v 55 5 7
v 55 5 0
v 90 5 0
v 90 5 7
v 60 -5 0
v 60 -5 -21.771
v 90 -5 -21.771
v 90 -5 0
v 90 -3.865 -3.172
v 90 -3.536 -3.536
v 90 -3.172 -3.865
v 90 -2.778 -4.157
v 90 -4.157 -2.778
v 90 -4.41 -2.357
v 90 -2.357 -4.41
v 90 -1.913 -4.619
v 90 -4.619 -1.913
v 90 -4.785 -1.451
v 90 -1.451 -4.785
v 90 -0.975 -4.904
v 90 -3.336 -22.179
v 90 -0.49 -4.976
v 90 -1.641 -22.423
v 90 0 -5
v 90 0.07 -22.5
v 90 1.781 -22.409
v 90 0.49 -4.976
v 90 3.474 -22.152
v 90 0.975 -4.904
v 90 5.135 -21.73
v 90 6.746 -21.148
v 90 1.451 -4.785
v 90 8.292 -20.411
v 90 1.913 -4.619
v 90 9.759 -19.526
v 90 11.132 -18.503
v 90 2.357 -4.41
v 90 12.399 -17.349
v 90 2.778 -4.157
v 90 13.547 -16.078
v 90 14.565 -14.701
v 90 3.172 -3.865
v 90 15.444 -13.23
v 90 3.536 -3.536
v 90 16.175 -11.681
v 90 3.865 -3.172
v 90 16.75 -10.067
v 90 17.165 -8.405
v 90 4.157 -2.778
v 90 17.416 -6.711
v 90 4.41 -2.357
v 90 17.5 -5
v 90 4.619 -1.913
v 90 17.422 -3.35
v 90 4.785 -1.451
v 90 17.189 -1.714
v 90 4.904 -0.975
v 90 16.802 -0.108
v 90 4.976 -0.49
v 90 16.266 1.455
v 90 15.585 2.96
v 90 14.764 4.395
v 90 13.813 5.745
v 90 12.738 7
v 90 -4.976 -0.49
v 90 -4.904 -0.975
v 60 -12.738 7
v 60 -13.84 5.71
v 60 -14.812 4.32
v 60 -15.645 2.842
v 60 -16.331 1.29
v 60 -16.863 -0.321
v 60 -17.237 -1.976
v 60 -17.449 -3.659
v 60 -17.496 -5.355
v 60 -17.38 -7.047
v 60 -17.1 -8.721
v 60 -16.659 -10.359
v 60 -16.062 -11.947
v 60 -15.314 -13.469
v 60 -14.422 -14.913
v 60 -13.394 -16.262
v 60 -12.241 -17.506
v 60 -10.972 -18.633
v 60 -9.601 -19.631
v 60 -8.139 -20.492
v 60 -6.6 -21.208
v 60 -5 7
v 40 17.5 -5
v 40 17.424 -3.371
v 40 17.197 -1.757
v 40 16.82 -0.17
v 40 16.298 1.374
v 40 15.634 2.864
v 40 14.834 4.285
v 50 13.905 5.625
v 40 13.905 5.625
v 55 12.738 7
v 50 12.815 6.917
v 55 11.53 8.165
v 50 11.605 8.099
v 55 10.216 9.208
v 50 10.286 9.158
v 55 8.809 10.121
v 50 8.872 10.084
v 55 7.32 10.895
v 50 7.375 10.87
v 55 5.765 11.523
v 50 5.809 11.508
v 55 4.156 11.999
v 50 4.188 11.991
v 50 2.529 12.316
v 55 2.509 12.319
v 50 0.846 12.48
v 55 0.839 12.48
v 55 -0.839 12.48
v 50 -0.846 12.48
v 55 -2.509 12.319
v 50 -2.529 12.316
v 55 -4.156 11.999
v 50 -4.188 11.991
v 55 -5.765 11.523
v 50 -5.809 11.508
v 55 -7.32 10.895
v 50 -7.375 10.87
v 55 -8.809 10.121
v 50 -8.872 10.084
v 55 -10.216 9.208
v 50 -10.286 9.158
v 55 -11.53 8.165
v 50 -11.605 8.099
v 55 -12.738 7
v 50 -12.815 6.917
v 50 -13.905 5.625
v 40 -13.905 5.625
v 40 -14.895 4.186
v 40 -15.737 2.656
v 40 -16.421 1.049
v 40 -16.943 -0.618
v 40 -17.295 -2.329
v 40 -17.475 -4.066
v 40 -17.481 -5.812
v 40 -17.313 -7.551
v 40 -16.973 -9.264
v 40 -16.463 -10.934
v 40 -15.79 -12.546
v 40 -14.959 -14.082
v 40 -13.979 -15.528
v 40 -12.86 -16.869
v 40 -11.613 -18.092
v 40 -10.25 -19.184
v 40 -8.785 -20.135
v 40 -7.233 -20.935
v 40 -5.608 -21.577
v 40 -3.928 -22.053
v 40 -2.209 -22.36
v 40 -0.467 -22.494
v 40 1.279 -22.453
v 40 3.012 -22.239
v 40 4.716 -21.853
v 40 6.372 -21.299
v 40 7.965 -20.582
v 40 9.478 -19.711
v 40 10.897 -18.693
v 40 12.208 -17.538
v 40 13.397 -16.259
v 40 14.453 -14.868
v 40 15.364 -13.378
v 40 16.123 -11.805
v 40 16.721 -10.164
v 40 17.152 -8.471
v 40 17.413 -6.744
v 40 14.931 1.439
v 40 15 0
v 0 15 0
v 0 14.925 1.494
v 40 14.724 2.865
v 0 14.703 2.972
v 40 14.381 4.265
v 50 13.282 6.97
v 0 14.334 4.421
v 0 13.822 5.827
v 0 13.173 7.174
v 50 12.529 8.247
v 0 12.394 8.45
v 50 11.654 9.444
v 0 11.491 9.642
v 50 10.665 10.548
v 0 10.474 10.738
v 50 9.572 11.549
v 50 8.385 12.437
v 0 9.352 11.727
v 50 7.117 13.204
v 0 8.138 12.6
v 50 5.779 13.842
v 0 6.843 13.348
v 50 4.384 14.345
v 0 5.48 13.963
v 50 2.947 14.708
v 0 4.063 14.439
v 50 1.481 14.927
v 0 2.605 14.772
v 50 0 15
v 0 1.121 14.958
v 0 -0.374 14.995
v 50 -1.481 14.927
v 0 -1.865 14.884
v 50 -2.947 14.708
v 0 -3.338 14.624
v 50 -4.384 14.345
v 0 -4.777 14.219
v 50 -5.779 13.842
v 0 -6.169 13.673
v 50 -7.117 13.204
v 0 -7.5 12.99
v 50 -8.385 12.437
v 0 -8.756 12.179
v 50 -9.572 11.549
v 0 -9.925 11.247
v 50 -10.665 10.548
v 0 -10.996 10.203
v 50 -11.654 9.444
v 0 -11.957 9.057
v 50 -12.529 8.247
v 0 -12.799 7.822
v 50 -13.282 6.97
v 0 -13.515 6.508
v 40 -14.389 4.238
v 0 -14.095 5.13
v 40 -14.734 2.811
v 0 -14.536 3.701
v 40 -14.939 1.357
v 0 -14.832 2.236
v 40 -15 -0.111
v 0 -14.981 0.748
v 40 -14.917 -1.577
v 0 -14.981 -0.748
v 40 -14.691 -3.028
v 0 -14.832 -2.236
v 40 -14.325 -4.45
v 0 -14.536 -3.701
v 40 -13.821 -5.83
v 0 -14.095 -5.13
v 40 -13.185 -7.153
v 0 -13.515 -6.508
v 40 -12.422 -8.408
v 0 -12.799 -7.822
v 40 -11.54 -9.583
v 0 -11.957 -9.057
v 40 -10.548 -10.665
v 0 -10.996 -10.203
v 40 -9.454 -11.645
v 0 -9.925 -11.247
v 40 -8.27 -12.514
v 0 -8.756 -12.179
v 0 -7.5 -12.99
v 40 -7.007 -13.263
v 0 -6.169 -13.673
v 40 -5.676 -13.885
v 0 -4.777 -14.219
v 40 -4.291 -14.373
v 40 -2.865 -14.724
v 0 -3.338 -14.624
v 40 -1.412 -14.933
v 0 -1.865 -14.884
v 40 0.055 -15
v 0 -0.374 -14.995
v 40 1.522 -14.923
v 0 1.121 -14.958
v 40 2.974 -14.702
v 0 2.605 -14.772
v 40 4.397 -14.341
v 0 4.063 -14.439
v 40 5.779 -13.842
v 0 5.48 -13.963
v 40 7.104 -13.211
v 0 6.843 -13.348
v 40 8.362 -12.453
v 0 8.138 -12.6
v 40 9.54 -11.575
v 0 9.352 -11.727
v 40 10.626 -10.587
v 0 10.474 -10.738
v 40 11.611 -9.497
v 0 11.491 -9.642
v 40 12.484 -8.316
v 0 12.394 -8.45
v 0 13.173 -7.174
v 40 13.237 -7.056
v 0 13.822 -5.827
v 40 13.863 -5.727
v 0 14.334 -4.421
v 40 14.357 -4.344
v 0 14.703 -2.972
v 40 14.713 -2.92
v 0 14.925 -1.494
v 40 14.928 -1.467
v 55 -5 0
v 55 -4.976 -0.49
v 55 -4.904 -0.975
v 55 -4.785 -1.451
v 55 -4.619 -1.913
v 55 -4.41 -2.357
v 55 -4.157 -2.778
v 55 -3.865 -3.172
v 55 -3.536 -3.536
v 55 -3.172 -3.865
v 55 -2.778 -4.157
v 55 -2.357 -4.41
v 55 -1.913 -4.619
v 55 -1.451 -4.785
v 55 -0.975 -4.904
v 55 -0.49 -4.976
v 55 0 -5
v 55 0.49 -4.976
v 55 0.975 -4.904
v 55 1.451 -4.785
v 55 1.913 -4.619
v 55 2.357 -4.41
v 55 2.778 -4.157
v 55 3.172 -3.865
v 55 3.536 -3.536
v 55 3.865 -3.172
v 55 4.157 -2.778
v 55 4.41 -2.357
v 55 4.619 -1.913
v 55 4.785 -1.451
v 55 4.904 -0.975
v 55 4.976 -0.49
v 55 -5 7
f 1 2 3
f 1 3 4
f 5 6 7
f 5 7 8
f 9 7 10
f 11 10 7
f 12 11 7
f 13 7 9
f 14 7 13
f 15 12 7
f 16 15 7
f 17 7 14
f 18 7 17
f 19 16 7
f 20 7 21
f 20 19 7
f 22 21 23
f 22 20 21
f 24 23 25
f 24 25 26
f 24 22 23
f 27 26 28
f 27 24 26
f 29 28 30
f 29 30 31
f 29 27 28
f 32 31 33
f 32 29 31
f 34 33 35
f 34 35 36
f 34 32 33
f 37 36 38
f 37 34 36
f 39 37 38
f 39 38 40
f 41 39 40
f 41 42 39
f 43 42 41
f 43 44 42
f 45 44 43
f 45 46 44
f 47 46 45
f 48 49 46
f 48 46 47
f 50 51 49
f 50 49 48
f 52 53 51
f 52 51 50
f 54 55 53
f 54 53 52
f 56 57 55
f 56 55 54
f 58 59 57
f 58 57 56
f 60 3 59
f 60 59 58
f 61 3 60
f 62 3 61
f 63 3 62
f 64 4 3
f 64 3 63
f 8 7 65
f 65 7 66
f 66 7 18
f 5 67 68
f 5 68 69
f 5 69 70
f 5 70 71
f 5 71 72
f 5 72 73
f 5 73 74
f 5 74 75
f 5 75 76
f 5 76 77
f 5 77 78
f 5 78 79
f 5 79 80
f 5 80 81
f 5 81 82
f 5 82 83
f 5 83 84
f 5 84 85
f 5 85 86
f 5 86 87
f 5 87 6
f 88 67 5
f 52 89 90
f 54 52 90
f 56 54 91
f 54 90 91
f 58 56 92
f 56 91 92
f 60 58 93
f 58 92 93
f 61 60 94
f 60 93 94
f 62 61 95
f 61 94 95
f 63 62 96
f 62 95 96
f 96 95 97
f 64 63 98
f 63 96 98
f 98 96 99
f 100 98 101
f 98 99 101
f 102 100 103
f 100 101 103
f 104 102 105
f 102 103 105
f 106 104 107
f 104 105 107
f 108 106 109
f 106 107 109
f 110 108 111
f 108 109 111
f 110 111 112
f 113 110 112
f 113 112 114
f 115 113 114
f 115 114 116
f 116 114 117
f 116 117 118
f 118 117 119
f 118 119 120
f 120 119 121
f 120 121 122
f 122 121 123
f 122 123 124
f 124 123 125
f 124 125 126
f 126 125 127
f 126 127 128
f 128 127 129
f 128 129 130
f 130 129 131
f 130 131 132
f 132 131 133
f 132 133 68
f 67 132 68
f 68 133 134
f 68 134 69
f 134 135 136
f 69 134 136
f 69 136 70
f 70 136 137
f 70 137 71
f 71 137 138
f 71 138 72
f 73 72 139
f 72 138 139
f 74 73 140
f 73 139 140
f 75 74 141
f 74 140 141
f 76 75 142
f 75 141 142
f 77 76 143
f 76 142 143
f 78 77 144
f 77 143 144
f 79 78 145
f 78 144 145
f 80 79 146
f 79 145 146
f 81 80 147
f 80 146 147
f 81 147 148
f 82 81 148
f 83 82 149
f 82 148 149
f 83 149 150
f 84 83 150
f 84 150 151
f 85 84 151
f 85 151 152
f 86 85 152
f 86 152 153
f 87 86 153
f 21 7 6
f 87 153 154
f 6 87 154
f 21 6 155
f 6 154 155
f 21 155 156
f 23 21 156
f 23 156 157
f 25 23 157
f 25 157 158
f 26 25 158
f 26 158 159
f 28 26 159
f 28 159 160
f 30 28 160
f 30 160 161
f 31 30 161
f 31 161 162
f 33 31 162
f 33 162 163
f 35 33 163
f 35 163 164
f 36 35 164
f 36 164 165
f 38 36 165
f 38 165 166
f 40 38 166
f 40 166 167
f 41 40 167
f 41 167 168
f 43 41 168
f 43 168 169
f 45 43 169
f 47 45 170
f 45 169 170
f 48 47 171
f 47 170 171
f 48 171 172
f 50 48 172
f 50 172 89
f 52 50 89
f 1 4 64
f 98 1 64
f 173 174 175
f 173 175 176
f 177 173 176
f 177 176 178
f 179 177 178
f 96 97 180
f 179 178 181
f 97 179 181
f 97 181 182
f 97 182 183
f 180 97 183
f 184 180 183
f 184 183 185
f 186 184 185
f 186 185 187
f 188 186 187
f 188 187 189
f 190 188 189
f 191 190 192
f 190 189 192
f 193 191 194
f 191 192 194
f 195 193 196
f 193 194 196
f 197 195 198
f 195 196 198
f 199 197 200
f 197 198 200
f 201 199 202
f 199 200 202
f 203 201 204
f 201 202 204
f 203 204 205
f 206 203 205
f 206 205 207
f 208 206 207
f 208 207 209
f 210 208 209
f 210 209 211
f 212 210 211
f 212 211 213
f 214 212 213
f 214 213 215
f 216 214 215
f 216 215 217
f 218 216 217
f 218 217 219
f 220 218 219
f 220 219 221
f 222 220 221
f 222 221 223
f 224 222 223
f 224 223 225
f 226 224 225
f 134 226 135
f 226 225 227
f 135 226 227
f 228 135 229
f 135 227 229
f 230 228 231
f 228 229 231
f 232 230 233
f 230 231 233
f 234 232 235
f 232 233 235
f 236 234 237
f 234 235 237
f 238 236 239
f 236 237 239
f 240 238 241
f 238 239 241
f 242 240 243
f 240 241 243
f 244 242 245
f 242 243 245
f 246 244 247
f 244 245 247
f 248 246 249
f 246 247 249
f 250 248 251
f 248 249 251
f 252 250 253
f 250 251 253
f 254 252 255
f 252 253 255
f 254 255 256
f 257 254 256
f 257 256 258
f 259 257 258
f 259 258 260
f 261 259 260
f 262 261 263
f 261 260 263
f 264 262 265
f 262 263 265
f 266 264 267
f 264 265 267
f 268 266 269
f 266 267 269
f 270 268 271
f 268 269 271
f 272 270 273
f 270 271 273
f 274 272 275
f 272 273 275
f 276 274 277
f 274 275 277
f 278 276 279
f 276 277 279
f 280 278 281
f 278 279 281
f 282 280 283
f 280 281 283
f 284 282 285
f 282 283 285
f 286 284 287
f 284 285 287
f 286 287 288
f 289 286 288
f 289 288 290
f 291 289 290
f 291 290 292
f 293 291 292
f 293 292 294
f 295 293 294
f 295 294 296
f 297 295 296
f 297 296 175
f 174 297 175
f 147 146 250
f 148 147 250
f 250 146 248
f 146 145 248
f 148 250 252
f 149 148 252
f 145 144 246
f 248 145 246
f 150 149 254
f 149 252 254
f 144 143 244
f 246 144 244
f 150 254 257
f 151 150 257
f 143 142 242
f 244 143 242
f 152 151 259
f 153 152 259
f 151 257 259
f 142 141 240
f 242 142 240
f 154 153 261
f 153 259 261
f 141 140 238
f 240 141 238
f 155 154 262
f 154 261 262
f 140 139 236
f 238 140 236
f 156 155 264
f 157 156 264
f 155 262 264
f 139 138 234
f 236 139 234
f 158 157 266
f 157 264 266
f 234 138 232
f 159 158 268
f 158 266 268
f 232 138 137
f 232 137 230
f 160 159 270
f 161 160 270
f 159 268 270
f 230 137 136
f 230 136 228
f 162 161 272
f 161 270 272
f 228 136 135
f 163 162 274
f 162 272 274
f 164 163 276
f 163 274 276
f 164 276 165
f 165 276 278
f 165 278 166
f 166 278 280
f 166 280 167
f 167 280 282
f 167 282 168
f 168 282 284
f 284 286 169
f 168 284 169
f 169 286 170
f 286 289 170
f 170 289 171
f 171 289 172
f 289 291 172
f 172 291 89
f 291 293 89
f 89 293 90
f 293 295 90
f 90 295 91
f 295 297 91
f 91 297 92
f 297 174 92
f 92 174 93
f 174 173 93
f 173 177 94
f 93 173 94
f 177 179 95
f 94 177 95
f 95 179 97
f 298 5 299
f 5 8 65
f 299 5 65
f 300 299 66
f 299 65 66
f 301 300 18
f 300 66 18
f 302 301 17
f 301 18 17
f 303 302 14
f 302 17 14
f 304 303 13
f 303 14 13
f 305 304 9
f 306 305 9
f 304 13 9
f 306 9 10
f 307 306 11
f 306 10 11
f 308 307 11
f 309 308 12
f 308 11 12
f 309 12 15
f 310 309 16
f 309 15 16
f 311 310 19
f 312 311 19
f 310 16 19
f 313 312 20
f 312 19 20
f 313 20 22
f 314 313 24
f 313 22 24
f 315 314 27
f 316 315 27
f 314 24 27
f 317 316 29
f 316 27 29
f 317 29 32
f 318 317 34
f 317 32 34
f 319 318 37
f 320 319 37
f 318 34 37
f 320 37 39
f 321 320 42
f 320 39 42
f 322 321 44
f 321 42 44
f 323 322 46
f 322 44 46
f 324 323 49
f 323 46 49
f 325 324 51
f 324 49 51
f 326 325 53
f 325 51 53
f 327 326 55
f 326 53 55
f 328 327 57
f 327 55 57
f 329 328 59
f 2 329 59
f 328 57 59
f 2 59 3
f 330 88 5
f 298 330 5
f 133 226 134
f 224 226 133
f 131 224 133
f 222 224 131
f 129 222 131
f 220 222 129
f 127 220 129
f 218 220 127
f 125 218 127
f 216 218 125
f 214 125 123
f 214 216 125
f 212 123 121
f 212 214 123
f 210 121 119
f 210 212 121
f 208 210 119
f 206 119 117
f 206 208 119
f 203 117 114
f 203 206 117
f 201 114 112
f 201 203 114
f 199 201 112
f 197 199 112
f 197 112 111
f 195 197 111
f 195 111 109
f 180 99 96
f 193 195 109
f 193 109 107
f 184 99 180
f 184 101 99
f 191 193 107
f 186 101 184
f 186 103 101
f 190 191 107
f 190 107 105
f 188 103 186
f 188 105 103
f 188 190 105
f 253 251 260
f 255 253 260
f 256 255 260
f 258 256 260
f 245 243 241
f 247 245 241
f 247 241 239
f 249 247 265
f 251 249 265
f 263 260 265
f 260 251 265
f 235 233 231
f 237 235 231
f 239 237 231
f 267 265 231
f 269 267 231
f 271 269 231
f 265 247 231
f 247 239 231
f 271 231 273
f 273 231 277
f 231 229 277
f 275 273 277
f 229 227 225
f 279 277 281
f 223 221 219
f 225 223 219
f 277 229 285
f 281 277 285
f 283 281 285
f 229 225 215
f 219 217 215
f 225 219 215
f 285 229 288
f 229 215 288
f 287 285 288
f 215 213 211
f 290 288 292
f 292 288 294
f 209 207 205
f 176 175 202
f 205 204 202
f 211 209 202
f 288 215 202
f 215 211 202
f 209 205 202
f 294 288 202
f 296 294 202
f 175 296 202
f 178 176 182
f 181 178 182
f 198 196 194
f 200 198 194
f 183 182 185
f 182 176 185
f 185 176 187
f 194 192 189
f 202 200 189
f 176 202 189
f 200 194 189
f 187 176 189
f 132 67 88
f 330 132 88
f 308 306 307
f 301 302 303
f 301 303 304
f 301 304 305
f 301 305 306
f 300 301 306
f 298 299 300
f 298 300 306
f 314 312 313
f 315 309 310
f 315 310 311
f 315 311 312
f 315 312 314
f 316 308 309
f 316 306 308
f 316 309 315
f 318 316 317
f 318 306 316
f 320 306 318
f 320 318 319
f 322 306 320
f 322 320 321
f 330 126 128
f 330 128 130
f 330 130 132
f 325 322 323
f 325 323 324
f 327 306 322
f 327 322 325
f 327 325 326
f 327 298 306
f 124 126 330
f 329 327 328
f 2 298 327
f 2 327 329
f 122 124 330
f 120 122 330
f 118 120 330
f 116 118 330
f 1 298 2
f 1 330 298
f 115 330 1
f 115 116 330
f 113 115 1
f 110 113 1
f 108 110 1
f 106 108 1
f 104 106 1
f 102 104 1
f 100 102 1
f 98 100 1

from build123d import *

# Parameters (mm, degrees)
F0_R     = 15
F1_DEPTH = 50
F3_DEPTH = 10
F2_R     = 17.5
F4_DEPTH = 40
F7_DEPTH = 35
F8_DEPTH = 30


with BuildPart() as f1:
    # F0 (on Right) → F1 (new body)
    with BuildSketch(Plane.YZ):
        Circle(F0_R)
    extrude(amount=F1_DEPTH)

    # F2 (on face) → F3 (join)
    with BuildSketch(Plane.YZ.offset(50)):
        with BuildLine():
            ThreePointArc((-13.9053721633, 5.625), (-5.6082968512, -21.5770023354), (17.5, -5))
            ThreePointArc((17.5, -5), (16.5770023354, 0.6082968512), (13.9053721633, 5.625))
            ThreePointArc((13.9053721633, 5.625), (14.7238001625, 2.8652589369), (15, 0))
            ThreePointArc((15, 0), (-2.8652589369, -14.7238001625), (-13.9053721633, 5.625))
        make_face()
        with BuildLine():
            ThreePointArc((15, 0), (14.7238001625, 2.8652589369), (13.9053721633, 5.625))
            ThreePointArc((13.9053721633, 5.625), (0, 12.5), (-13.9053721633, 5.625))
            ThreePointArc((-13.9053721633, 5.625), (-2.8652589369, -14.7238001625), (15, 0))
        make_face()
    extrude(amount=-F3_DEPTH)

    # F2 (on face) → F4 (join)
    with BuildSketch(Plane.YZ.offset(50)):
        with Locations((0, -5)):
            Circle(F2_R)
    extrude(amount=F4_DEPTH)

    # F6 (on face) → F7 (cut)
    with BuildSketch(Plane.YZ.offset(90)):
        with BuildLine():
            ThreePointArc((12.7377392029, 7), (0, 12.5), (-12.7377392029, 7))
            Line((-12.7377392029, 7), (-5, 7))
            Line((-5, 7), (-5, 0))
            ThreePointArc((-5, 0), (0, -5), (5, 0))
            Line((5, 0), (5, 7))
            Line((5, 7), (12.7377392029, 7))
        make_face()
    extrude(amount=-F7_DEPTH, mode=Mode.SUBTRACT)

    # F6 (on face) → F8 (cut)
    with BuildSketch(Plane.YZ.offset(90)):
        with BuildLine():
            Line((-5, 7), (-12.7377392029, 7))
            ThreePointArc((-12.7377392029, 7), (-16.8994794889, -9.5450624864), (-5, -21.7705098312))
            Line((-5, -21.7705098312), (-5, 0))
            Line((-5, 0), (-5, 7))
        make_face()
    extrude(amount=-F8_DEPTH, mode=Mode.SUBTRACT)


solid = f1.part
